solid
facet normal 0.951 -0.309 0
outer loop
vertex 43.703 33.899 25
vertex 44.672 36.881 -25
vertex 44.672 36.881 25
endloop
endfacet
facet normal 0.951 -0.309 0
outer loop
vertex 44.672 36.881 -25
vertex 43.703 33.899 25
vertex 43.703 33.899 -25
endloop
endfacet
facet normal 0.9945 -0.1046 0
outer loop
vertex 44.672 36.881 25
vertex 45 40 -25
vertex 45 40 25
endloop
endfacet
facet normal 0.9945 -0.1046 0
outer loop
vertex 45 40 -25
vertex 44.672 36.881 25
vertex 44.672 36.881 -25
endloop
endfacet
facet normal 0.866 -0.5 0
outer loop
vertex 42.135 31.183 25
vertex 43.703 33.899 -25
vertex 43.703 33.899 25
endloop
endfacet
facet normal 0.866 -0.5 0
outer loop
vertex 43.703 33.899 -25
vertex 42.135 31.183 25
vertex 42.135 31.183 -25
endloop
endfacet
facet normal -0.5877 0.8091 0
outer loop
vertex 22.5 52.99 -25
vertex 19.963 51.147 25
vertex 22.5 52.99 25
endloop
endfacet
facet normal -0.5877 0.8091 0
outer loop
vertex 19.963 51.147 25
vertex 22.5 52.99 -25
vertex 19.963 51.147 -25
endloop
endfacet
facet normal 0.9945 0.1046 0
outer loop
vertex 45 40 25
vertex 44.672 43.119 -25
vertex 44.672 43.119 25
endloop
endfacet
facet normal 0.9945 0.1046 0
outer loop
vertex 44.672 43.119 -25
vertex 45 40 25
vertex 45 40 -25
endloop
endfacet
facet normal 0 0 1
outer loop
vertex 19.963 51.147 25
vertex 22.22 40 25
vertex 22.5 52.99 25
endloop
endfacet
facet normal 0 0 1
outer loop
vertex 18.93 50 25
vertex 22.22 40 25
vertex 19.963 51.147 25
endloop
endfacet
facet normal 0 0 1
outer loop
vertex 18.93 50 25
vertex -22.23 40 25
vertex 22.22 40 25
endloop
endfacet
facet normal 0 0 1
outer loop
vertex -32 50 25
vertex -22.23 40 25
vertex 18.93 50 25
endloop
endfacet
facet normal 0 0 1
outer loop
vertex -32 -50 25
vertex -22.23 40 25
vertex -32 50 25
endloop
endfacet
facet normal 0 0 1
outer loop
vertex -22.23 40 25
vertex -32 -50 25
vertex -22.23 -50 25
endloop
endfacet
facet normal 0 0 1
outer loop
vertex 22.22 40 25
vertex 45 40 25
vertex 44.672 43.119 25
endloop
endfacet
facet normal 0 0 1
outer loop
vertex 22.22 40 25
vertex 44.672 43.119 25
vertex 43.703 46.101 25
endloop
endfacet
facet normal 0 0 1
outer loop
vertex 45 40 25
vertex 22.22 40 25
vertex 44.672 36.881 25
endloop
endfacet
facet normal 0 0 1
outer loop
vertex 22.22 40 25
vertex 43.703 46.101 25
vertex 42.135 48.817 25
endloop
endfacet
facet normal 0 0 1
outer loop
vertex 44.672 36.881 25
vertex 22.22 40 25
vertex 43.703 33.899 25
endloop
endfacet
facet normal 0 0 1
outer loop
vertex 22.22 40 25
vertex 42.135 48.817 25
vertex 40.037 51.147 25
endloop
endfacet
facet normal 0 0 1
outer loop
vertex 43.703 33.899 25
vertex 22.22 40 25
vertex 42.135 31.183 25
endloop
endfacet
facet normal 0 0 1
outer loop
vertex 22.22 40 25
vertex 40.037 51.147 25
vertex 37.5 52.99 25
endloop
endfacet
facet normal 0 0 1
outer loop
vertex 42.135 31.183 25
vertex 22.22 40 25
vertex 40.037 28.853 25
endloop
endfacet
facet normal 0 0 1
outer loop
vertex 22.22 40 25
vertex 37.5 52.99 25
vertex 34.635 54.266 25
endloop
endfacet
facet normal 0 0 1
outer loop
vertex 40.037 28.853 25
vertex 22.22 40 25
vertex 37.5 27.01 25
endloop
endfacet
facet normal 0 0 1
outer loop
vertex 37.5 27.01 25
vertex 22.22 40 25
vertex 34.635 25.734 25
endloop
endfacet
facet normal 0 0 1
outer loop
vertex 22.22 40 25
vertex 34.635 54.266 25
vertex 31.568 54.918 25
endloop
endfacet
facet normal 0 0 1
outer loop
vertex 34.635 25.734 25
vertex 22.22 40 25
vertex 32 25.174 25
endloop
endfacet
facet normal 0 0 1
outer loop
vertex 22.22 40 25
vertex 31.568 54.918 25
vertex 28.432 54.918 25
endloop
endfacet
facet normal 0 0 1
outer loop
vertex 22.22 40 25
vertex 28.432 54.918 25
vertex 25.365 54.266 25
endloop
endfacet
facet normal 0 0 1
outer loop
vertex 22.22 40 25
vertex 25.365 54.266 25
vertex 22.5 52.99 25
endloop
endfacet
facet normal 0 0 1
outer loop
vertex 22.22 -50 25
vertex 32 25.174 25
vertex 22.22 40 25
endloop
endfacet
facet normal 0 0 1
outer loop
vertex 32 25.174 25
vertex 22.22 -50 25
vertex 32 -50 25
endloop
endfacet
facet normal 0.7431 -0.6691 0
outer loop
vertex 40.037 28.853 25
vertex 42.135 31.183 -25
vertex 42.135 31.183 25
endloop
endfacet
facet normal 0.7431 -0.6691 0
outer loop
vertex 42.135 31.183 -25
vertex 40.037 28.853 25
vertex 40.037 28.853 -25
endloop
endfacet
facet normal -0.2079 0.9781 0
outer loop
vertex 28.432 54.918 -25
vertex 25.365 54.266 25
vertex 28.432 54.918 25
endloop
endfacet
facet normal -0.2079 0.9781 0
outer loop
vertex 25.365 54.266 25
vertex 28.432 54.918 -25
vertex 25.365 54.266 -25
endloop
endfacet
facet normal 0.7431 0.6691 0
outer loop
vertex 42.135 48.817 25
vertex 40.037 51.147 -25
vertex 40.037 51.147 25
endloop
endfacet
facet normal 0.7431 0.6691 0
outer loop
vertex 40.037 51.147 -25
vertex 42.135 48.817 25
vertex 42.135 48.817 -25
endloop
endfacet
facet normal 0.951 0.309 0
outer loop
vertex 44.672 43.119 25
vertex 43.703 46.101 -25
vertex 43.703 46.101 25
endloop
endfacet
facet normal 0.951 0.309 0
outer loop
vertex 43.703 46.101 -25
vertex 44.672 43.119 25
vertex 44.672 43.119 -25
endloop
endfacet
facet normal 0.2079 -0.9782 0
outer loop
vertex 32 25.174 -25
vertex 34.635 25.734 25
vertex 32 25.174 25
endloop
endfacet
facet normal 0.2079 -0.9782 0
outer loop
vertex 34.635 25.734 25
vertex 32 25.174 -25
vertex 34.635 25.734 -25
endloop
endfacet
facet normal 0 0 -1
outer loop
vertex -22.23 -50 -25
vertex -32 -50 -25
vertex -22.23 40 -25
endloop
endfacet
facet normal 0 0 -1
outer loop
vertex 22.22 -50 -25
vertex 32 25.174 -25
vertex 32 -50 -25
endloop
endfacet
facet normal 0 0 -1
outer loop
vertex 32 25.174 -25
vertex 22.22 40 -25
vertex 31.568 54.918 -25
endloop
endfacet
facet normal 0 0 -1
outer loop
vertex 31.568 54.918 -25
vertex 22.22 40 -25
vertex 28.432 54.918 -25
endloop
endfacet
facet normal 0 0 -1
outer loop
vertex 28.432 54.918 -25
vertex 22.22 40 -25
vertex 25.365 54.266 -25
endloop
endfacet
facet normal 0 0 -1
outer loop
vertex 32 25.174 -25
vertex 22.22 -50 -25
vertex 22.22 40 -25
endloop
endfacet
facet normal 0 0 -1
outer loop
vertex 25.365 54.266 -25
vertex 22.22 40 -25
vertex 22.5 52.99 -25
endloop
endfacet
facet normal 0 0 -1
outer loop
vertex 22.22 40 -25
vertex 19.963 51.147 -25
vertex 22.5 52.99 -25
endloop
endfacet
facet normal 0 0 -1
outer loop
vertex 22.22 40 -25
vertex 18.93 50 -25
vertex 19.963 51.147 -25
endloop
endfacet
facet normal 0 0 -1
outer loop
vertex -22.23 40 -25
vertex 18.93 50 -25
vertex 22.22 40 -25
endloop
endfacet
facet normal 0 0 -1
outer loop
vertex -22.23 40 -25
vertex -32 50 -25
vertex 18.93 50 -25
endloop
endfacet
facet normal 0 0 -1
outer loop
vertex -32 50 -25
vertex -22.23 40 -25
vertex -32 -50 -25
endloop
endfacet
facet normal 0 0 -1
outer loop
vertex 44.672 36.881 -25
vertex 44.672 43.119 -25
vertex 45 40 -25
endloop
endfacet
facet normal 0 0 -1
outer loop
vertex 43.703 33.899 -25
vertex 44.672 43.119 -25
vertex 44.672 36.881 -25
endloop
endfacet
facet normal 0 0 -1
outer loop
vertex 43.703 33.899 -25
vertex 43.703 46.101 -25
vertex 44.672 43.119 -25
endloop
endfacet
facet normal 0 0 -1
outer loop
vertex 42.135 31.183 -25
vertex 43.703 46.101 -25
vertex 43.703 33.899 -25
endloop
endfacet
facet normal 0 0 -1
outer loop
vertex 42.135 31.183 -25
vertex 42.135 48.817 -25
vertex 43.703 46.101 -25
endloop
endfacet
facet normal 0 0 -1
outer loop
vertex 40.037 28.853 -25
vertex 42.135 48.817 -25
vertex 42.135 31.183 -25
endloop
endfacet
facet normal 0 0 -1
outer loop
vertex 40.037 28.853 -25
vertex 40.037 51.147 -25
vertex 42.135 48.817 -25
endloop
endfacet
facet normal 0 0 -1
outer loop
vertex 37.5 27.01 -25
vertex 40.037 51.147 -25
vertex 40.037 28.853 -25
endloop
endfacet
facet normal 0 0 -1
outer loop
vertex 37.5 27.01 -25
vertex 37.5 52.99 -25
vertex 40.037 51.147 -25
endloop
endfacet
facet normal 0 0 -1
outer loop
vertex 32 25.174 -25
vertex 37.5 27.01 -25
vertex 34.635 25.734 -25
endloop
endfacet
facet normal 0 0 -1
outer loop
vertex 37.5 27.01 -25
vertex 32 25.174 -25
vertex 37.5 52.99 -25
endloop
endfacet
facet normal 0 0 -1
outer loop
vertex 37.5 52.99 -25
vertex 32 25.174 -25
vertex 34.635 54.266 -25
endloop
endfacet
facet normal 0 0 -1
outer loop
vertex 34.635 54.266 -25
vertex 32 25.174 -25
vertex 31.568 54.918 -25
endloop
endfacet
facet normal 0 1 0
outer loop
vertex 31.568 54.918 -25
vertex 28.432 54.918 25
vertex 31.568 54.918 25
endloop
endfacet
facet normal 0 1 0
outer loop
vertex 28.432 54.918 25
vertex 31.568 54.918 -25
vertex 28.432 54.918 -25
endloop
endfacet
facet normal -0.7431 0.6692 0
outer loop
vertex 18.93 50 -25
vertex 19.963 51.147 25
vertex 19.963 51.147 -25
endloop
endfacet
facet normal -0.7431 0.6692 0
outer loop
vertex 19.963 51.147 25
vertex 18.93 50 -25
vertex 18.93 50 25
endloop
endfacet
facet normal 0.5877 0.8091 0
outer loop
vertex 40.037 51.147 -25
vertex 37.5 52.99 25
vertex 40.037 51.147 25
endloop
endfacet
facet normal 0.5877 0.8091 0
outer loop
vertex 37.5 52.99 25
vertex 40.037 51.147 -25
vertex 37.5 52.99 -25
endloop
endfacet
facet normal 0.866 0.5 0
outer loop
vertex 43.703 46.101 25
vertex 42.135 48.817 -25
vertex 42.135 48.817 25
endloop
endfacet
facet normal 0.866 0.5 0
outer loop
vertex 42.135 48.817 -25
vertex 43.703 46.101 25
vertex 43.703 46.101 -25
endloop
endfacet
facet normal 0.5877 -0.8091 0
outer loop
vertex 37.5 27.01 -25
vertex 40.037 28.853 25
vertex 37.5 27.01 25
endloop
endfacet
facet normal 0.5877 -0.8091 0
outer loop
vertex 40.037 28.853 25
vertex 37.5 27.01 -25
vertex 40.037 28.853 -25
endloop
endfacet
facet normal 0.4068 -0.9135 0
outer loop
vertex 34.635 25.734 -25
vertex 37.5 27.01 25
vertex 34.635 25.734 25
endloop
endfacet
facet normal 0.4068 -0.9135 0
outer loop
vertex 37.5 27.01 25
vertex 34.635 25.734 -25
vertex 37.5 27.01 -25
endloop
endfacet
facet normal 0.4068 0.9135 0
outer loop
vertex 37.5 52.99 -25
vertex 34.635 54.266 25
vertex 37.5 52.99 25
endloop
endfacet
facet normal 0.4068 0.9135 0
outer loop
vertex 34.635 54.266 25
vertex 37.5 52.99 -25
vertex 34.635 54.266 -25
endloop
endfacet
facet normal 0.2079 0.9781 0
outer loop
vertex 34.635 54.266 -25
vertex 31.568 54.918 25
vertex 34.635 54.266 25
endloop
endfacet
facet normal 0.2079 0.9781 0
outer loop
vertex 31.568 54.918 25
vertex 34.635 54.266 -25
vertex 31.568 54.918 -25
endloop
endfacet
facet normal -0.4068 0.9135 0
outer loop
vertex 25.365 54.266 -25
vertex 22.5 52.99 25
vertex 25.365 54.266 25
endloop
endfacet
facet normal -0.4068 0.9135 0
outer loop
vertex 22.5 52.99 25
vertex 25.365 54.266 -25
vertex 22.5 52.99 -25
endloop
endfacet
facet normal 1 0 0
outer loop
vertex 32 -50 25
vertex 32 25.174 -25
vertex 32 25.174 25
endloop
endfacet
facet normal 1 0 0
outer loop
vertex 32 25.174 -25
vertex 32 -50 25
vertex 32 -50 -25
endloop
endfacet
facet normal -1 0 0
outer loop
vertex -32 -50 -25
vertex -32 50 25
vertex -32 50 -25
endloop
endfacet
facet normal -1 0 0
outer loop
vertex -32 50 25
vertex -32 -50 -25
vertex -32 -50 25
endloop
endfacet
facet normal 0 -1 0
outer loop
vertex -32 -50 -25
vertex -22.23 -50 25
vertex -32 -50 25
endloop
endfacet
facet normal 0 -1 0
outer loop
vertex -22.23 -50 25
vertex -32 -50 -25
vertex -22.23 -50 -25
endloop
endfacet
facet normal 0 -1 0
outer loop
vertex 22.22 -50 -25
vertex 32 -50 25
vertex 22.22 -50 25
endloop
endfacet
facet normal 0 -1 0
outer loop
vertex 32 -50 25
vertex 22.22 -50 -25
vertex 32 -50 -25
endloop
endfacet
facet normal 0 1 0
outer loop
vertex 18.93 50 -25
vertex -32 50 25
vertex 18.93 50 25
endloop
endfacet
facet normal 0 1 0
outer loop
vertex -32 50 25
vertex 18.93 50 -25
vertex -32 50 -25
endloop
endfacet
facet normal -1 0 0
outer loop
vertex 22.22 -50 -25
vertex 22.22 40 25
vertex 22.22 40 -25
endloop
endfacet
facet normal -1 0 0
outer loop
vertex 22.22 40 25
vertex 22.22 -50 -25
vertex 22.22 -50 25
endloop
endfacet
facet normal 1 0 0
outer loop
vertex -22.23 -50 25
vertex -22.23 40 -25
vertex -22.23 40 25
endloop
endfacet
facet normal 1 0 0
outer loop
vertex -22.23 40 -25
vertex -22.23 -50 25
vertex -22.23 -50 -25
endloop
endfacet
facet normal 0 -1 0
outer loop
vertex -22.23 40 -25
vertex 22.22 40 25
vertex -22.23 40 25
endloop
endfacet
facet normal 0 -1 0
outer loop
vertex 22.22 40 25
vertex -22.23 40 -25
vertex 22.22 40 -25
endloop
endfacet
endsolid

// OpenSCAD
// Door Stop
// Colin Faulkingham 2013 colin.faulkingham@gmail.com
//

// With a lid so it sit's on top of the door.
//


rotate([180,0,0]){
	difference() {
		// Door stop is almost 4" long
		union(){
			translate([30,-40,-25]) cylinder(50,15,15);
			cube([64,100,50],center = true);
		}
		// Door is 1.75" thick 44.45mm
		//translate([-22.23,-40,-30]) cube([44.45,100,54]); 

		// Without lid
		translate([-22.23,-40,-30]) cube([44.45,100,60]); 

	}
}
